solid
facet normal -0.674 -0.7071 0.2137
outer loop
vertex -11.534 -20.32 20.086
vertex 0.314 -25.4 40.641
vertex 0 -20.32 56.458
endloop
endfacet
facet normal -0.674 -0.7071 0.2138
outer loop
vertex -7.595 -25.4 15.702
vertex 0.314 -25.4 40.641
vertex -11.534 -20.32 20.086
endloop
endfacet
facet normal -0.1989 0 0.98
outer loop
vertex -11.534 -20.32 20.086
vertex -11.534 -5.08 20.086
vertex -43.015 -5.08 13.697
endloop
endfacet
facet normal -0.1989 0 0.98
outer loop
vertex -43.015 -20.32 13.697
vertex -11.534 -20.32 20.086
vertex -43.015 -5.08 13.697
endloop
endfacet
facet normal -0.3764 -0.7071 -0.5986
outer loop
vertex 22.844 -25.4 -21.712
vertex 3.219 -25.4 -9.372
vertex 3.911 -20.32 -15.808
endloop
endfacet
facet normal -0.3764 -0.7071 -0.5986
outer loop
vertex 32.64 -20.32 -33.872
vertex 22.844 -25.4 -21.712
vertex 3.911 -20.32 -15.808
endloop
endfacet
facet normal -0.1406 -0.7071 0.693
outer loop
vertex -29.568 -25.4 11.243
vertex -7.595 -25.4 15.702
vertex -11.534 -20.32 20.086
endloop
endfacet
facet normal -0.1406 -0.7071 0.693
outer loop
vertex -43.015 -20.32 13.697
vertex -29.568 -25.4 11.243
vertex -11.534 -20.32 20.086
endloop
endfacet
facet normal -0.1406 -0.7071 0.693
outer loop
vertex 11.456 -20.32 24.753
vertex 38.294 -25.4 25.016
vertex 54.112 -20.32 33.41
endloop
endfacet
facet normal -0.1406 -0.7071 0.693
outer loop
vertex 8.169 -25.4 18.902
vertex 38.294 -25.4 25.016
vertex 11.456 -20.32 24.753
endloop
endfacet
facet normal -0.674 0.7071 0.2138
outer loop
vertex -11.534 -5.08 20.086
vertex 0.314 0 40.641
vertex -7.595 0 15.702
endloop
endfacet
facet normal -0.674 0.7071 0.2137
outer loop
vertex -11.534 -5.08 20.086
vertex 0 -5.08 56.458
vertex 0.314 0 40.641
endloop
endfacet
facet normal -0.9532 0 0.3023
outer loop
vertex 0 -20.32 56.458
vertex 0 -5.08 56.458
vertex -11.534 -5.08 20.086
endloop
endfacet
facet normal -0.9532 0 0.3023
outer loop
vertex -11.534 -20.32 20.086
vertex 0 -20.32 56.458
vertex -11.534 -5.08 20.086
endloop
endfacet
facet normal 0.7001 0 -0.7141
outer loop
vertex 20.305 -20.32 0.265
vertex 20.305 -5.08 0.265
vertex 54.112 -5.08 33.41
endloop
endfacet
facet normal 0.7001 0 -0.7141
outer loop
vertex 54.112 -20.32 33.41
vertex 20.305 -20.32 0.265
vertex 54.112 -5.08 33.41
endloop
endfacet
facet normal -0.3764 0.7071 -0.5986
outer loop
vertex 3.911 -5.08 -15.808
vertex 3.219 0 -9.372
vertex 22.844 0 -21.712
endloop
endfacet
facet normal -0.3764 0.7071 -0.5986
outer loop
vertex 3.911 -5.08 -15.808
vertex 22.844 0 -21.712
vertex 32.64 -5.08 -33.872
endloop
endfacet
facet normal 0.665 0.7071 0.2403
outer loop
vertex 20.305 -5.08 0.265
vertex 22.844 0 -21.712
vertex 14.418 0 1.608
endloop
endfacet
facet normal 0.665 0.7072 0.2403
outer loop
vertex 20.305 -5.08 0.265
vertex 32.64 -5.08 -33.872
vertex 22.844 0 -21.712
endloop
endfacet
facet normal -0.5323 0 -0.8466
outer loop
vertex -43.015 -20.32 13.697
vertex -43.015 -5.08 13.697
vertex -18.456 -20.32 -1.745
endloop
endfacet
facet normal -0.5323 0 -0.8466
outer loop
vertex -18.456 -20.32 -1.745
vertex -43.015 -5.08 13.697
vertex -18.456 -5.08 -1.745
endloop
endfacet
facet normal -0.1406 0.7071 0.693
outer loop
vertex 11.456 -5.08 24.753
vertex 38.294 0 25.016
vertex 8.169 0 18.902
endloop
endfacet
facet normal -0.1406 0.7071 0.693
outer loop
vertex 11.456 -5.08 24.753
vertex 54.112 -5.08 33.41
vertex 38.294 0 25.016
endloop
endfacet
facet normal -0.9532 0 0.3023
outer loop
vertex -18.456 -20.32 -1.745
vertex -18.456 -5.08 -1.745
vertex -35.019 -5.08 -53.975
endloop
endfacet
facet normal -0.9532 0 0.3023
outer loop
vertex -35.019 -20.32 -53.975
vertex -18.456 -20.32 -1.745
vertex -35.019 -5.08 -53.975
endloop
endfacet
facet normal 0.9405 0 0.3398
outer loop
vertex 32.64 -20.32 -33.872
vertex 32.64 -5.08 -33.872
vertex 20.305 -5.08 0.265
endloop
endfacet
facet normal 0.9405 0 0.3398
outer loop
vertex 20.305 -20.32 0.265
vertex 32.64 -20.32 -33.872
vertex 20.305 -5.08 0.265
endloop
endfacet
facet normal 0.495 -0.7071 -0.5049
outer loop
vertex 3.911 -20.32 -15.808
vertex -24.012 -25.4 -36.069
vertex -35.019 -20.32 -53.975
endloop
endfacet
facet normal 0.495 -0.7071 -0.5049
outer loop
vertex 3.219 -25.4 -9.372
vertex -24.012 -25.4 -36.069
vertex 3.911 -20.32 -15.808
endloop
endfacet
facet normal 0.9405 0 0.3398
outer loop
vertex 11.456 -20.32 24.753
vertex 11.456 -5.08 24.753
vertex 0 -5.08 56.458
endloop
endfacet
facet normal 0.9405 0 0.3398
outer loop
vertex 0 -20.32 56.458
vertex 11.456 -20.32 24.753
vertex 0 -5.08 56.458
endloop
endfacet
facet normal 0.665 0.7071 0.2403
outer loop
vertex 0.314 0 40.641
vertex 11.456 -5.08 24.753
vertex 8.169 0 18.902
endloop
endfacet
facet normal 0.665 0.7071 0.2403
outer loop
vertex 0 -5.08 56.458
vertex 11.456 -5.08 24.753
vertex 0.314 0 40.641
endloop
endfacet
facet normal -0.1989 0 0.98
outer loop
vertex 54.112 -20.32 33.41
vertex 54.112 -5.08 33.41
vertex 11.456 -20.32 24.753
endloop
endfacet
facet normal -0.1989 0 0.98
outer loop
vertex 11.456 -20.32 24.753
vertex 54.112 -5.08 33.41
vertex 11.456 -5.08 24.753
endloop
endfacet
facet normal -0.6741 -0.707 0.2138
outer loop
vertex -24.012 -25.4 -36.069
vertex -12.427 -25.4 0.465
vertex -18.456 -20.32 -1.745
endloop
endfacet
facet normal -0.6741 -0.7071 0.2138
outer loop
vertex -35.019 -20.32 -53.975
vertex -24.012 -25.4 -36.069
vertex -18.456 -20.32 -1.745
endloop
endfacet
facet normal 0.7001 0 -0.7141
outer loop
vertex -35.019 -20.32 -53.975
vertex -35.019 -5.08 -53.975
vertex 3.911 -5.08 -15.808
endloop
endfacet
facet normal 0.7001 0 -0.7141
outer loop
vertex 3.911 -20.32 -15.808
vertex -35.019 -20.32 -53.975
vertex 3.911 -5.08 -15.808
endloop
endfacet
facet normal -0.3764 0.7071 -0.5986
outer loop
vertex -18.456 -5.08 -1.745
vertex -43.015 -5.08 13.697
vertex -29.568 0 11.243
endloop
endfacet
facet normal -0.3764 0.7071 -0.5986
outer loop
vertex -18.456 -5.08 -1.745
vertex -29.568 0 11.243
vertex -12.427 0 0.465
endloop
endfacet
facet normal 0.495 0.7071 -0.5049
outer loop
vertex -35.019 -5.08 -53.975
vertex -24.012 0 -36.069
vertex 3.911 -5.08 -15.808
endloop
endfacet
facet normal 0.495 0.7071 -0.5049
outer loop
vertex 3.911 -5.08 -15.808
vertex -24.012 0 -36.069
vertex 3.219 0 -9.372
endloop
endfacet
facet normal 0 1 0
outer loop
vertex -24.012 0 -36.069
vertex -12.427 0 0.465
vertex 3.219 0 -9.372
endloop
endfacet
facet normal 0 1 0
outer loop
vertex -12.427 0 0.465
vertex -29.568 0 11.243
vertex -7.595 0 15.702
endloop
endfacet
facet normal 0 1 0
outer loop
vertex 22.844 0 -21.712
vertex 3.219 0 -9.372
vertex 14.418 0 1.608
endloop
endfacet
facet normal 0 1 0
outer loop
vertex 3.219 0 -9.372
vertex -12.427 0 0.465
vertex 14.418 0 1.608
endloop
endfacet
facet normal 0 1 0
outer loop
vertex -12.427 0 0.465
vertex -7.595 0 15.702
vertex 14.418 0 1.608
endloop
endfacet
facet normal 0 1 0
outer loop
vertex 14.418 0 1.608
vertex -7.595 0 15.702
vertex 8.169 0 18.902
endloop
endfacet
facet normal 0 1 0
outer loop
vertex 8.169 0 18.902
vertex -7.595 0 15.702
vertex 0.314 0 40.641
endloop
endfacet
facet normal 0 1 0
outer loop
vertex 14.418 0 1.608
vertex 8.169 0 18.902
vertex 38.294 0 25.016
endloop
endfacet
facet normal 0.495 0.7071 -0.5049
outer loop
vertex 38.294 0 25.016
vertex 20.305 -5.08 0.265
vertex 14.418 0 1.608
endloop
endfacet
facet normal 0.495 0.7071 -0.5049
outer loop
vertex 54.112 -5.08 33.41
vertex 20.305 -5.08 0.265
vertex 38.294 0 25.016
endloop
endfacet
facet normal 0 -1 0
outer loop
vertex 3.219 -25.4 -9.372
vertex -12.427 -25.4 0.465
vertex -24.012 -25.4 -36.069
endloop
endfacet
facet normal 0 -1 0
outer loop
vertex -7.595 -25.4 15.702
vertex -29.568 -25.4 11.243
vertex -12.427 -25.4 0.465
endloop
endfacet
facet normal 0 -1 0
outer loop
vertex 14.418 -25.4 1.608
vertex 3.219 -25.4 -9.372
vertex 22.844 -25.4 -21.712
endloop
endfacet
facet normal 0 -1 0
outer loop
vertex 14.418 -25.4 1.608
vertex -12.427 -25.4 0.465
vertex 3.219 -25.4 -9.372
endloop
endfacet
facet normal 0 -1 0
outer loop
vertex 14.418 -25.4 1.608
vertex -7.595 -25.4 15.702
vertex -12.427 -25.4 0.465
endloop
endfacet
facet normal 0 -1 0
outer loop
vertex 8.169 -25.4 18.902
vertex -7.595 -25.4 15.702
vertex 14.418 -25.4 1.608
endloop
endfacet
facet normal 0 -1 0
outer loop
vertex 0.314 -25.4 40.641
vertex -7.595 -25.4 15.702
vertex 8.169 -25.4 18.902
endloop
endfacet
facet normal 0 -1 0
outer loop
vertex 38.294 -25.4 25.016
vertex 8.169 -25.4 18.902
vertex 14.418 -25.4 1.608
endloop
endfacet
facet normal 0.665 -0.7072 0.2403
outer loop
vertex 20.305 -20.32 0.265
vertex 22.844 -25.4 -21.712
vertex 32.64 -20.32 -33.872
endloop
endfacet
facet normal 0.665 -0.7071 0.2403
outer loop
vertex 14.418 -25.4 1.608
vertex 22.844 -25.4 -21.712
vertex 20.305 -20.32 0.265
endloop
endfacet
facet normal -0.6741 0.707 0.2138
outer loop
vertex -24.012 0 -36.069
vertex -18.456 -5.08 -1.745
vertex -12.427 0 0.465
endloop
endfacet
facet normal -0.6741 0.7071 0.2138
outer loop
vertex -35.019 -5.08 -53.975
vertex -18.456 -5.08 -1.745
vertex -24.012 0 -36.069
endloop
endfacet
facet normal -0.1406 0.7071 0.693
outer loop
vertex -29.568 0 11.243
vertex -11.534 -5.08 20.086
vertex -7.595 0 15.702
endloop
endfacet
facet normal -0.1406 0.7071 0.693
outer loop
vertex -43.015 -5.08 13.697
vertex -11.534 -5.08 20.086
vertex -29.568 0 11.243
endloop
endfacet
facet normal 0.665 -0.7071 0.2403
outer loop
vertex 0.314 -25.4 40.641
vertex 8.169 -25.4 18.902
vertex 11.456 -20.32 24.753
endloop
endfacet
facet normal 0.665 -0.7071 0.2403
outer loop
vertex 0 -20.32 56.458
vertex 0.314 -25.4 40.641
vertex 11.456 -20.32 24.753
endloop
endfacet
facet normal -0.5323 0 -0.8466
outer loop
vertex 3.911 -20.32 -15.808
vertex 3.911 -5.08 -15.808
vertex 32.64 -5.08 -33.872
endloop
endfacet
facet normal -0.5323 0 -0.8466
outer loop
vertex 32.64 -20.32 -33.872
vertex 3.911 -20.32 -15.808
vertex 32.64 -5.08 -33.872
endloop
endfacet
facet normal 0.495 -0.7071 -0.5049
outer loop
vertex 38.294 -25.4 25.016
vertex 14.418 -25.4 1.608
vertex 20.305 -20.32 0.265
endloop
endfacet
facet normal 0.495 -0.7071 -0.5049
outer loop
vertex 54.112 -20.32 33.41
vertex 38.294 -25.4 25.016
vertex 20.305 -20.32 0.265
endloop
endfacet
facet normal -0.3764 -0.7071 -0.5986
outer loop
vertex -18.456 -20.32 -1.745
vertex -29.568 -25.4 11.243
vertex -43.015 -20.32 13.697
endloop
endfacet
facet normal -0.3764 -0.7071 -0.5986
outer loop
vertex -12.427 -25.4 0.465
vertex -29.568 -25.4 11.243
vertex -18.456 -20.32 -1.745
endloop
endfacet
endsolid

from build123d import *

# Parameters (mm, degrees)
F1_DEPTH = 25.4
F2_SIZE  = 5.08
F3_SIZE  = 5.08


with BuildPart() as f1:
    # F0 (on Front) → F1 (new body)
    with BuildSketch(Plane.XZ):
        Polygon((3.910511, -15.808209), (32.639593, -33.872131), (20.304644, 0.264795), (54.112185, 33.410113), (11.456304, 24.752544), (0, 56.457825), (-11.533625, 20.086437), (-43.014806, 13.69692), (-18.456406, -1.744611), (-35.019126, -53.975292), align=None)
    extrude(amount=F1_DEPTH)

    # F2
    f2_edges = [f1.edges().sort_by_distance(p)[0] for p in [
        (-5.766813, -25.4, 38.272131),
        (-27.274216, -25.4, 16.891679),
        (-15.554307, -25.4, -34.89175),
        (18.275052, -25.4, -24.84017),
        (26.472118, -25.4, -16.803668),
        (37.208414, -25.4, 16.837454),
        (32.784244, -25.4, 29.081329),
        (5.728152, -25.4, 40.605185),
        (-30.735606, -25.4, 5.976154),
        (-26.737766, -25.4, -27.859951),
    ]]
    chamfer(f2_edges, length=F2_SIZE)

    # F3
    f3_edges = [f1.edges().sort_by_distance(p)[0] for p in [
        (-15.554307, 0, -34.89175),
        (18.275052, 0, -24.84017),
        (26.472118, 0, -16.803668),
        (37.208414, 0, 16.837454),
        (32.784244, 0, 29.081329),
        (5.728152, 0, 40.605185),
        (-5.766813, 0, 38.272131),
        (-27.274216, 0, 16.891679),
        (-30.735606, 0, 5.976154),
        (-26.737766, 0, -27.859951),
    ]]
    chamfer(f3_edges, length=F3_SIZE)


solid = f1.part
